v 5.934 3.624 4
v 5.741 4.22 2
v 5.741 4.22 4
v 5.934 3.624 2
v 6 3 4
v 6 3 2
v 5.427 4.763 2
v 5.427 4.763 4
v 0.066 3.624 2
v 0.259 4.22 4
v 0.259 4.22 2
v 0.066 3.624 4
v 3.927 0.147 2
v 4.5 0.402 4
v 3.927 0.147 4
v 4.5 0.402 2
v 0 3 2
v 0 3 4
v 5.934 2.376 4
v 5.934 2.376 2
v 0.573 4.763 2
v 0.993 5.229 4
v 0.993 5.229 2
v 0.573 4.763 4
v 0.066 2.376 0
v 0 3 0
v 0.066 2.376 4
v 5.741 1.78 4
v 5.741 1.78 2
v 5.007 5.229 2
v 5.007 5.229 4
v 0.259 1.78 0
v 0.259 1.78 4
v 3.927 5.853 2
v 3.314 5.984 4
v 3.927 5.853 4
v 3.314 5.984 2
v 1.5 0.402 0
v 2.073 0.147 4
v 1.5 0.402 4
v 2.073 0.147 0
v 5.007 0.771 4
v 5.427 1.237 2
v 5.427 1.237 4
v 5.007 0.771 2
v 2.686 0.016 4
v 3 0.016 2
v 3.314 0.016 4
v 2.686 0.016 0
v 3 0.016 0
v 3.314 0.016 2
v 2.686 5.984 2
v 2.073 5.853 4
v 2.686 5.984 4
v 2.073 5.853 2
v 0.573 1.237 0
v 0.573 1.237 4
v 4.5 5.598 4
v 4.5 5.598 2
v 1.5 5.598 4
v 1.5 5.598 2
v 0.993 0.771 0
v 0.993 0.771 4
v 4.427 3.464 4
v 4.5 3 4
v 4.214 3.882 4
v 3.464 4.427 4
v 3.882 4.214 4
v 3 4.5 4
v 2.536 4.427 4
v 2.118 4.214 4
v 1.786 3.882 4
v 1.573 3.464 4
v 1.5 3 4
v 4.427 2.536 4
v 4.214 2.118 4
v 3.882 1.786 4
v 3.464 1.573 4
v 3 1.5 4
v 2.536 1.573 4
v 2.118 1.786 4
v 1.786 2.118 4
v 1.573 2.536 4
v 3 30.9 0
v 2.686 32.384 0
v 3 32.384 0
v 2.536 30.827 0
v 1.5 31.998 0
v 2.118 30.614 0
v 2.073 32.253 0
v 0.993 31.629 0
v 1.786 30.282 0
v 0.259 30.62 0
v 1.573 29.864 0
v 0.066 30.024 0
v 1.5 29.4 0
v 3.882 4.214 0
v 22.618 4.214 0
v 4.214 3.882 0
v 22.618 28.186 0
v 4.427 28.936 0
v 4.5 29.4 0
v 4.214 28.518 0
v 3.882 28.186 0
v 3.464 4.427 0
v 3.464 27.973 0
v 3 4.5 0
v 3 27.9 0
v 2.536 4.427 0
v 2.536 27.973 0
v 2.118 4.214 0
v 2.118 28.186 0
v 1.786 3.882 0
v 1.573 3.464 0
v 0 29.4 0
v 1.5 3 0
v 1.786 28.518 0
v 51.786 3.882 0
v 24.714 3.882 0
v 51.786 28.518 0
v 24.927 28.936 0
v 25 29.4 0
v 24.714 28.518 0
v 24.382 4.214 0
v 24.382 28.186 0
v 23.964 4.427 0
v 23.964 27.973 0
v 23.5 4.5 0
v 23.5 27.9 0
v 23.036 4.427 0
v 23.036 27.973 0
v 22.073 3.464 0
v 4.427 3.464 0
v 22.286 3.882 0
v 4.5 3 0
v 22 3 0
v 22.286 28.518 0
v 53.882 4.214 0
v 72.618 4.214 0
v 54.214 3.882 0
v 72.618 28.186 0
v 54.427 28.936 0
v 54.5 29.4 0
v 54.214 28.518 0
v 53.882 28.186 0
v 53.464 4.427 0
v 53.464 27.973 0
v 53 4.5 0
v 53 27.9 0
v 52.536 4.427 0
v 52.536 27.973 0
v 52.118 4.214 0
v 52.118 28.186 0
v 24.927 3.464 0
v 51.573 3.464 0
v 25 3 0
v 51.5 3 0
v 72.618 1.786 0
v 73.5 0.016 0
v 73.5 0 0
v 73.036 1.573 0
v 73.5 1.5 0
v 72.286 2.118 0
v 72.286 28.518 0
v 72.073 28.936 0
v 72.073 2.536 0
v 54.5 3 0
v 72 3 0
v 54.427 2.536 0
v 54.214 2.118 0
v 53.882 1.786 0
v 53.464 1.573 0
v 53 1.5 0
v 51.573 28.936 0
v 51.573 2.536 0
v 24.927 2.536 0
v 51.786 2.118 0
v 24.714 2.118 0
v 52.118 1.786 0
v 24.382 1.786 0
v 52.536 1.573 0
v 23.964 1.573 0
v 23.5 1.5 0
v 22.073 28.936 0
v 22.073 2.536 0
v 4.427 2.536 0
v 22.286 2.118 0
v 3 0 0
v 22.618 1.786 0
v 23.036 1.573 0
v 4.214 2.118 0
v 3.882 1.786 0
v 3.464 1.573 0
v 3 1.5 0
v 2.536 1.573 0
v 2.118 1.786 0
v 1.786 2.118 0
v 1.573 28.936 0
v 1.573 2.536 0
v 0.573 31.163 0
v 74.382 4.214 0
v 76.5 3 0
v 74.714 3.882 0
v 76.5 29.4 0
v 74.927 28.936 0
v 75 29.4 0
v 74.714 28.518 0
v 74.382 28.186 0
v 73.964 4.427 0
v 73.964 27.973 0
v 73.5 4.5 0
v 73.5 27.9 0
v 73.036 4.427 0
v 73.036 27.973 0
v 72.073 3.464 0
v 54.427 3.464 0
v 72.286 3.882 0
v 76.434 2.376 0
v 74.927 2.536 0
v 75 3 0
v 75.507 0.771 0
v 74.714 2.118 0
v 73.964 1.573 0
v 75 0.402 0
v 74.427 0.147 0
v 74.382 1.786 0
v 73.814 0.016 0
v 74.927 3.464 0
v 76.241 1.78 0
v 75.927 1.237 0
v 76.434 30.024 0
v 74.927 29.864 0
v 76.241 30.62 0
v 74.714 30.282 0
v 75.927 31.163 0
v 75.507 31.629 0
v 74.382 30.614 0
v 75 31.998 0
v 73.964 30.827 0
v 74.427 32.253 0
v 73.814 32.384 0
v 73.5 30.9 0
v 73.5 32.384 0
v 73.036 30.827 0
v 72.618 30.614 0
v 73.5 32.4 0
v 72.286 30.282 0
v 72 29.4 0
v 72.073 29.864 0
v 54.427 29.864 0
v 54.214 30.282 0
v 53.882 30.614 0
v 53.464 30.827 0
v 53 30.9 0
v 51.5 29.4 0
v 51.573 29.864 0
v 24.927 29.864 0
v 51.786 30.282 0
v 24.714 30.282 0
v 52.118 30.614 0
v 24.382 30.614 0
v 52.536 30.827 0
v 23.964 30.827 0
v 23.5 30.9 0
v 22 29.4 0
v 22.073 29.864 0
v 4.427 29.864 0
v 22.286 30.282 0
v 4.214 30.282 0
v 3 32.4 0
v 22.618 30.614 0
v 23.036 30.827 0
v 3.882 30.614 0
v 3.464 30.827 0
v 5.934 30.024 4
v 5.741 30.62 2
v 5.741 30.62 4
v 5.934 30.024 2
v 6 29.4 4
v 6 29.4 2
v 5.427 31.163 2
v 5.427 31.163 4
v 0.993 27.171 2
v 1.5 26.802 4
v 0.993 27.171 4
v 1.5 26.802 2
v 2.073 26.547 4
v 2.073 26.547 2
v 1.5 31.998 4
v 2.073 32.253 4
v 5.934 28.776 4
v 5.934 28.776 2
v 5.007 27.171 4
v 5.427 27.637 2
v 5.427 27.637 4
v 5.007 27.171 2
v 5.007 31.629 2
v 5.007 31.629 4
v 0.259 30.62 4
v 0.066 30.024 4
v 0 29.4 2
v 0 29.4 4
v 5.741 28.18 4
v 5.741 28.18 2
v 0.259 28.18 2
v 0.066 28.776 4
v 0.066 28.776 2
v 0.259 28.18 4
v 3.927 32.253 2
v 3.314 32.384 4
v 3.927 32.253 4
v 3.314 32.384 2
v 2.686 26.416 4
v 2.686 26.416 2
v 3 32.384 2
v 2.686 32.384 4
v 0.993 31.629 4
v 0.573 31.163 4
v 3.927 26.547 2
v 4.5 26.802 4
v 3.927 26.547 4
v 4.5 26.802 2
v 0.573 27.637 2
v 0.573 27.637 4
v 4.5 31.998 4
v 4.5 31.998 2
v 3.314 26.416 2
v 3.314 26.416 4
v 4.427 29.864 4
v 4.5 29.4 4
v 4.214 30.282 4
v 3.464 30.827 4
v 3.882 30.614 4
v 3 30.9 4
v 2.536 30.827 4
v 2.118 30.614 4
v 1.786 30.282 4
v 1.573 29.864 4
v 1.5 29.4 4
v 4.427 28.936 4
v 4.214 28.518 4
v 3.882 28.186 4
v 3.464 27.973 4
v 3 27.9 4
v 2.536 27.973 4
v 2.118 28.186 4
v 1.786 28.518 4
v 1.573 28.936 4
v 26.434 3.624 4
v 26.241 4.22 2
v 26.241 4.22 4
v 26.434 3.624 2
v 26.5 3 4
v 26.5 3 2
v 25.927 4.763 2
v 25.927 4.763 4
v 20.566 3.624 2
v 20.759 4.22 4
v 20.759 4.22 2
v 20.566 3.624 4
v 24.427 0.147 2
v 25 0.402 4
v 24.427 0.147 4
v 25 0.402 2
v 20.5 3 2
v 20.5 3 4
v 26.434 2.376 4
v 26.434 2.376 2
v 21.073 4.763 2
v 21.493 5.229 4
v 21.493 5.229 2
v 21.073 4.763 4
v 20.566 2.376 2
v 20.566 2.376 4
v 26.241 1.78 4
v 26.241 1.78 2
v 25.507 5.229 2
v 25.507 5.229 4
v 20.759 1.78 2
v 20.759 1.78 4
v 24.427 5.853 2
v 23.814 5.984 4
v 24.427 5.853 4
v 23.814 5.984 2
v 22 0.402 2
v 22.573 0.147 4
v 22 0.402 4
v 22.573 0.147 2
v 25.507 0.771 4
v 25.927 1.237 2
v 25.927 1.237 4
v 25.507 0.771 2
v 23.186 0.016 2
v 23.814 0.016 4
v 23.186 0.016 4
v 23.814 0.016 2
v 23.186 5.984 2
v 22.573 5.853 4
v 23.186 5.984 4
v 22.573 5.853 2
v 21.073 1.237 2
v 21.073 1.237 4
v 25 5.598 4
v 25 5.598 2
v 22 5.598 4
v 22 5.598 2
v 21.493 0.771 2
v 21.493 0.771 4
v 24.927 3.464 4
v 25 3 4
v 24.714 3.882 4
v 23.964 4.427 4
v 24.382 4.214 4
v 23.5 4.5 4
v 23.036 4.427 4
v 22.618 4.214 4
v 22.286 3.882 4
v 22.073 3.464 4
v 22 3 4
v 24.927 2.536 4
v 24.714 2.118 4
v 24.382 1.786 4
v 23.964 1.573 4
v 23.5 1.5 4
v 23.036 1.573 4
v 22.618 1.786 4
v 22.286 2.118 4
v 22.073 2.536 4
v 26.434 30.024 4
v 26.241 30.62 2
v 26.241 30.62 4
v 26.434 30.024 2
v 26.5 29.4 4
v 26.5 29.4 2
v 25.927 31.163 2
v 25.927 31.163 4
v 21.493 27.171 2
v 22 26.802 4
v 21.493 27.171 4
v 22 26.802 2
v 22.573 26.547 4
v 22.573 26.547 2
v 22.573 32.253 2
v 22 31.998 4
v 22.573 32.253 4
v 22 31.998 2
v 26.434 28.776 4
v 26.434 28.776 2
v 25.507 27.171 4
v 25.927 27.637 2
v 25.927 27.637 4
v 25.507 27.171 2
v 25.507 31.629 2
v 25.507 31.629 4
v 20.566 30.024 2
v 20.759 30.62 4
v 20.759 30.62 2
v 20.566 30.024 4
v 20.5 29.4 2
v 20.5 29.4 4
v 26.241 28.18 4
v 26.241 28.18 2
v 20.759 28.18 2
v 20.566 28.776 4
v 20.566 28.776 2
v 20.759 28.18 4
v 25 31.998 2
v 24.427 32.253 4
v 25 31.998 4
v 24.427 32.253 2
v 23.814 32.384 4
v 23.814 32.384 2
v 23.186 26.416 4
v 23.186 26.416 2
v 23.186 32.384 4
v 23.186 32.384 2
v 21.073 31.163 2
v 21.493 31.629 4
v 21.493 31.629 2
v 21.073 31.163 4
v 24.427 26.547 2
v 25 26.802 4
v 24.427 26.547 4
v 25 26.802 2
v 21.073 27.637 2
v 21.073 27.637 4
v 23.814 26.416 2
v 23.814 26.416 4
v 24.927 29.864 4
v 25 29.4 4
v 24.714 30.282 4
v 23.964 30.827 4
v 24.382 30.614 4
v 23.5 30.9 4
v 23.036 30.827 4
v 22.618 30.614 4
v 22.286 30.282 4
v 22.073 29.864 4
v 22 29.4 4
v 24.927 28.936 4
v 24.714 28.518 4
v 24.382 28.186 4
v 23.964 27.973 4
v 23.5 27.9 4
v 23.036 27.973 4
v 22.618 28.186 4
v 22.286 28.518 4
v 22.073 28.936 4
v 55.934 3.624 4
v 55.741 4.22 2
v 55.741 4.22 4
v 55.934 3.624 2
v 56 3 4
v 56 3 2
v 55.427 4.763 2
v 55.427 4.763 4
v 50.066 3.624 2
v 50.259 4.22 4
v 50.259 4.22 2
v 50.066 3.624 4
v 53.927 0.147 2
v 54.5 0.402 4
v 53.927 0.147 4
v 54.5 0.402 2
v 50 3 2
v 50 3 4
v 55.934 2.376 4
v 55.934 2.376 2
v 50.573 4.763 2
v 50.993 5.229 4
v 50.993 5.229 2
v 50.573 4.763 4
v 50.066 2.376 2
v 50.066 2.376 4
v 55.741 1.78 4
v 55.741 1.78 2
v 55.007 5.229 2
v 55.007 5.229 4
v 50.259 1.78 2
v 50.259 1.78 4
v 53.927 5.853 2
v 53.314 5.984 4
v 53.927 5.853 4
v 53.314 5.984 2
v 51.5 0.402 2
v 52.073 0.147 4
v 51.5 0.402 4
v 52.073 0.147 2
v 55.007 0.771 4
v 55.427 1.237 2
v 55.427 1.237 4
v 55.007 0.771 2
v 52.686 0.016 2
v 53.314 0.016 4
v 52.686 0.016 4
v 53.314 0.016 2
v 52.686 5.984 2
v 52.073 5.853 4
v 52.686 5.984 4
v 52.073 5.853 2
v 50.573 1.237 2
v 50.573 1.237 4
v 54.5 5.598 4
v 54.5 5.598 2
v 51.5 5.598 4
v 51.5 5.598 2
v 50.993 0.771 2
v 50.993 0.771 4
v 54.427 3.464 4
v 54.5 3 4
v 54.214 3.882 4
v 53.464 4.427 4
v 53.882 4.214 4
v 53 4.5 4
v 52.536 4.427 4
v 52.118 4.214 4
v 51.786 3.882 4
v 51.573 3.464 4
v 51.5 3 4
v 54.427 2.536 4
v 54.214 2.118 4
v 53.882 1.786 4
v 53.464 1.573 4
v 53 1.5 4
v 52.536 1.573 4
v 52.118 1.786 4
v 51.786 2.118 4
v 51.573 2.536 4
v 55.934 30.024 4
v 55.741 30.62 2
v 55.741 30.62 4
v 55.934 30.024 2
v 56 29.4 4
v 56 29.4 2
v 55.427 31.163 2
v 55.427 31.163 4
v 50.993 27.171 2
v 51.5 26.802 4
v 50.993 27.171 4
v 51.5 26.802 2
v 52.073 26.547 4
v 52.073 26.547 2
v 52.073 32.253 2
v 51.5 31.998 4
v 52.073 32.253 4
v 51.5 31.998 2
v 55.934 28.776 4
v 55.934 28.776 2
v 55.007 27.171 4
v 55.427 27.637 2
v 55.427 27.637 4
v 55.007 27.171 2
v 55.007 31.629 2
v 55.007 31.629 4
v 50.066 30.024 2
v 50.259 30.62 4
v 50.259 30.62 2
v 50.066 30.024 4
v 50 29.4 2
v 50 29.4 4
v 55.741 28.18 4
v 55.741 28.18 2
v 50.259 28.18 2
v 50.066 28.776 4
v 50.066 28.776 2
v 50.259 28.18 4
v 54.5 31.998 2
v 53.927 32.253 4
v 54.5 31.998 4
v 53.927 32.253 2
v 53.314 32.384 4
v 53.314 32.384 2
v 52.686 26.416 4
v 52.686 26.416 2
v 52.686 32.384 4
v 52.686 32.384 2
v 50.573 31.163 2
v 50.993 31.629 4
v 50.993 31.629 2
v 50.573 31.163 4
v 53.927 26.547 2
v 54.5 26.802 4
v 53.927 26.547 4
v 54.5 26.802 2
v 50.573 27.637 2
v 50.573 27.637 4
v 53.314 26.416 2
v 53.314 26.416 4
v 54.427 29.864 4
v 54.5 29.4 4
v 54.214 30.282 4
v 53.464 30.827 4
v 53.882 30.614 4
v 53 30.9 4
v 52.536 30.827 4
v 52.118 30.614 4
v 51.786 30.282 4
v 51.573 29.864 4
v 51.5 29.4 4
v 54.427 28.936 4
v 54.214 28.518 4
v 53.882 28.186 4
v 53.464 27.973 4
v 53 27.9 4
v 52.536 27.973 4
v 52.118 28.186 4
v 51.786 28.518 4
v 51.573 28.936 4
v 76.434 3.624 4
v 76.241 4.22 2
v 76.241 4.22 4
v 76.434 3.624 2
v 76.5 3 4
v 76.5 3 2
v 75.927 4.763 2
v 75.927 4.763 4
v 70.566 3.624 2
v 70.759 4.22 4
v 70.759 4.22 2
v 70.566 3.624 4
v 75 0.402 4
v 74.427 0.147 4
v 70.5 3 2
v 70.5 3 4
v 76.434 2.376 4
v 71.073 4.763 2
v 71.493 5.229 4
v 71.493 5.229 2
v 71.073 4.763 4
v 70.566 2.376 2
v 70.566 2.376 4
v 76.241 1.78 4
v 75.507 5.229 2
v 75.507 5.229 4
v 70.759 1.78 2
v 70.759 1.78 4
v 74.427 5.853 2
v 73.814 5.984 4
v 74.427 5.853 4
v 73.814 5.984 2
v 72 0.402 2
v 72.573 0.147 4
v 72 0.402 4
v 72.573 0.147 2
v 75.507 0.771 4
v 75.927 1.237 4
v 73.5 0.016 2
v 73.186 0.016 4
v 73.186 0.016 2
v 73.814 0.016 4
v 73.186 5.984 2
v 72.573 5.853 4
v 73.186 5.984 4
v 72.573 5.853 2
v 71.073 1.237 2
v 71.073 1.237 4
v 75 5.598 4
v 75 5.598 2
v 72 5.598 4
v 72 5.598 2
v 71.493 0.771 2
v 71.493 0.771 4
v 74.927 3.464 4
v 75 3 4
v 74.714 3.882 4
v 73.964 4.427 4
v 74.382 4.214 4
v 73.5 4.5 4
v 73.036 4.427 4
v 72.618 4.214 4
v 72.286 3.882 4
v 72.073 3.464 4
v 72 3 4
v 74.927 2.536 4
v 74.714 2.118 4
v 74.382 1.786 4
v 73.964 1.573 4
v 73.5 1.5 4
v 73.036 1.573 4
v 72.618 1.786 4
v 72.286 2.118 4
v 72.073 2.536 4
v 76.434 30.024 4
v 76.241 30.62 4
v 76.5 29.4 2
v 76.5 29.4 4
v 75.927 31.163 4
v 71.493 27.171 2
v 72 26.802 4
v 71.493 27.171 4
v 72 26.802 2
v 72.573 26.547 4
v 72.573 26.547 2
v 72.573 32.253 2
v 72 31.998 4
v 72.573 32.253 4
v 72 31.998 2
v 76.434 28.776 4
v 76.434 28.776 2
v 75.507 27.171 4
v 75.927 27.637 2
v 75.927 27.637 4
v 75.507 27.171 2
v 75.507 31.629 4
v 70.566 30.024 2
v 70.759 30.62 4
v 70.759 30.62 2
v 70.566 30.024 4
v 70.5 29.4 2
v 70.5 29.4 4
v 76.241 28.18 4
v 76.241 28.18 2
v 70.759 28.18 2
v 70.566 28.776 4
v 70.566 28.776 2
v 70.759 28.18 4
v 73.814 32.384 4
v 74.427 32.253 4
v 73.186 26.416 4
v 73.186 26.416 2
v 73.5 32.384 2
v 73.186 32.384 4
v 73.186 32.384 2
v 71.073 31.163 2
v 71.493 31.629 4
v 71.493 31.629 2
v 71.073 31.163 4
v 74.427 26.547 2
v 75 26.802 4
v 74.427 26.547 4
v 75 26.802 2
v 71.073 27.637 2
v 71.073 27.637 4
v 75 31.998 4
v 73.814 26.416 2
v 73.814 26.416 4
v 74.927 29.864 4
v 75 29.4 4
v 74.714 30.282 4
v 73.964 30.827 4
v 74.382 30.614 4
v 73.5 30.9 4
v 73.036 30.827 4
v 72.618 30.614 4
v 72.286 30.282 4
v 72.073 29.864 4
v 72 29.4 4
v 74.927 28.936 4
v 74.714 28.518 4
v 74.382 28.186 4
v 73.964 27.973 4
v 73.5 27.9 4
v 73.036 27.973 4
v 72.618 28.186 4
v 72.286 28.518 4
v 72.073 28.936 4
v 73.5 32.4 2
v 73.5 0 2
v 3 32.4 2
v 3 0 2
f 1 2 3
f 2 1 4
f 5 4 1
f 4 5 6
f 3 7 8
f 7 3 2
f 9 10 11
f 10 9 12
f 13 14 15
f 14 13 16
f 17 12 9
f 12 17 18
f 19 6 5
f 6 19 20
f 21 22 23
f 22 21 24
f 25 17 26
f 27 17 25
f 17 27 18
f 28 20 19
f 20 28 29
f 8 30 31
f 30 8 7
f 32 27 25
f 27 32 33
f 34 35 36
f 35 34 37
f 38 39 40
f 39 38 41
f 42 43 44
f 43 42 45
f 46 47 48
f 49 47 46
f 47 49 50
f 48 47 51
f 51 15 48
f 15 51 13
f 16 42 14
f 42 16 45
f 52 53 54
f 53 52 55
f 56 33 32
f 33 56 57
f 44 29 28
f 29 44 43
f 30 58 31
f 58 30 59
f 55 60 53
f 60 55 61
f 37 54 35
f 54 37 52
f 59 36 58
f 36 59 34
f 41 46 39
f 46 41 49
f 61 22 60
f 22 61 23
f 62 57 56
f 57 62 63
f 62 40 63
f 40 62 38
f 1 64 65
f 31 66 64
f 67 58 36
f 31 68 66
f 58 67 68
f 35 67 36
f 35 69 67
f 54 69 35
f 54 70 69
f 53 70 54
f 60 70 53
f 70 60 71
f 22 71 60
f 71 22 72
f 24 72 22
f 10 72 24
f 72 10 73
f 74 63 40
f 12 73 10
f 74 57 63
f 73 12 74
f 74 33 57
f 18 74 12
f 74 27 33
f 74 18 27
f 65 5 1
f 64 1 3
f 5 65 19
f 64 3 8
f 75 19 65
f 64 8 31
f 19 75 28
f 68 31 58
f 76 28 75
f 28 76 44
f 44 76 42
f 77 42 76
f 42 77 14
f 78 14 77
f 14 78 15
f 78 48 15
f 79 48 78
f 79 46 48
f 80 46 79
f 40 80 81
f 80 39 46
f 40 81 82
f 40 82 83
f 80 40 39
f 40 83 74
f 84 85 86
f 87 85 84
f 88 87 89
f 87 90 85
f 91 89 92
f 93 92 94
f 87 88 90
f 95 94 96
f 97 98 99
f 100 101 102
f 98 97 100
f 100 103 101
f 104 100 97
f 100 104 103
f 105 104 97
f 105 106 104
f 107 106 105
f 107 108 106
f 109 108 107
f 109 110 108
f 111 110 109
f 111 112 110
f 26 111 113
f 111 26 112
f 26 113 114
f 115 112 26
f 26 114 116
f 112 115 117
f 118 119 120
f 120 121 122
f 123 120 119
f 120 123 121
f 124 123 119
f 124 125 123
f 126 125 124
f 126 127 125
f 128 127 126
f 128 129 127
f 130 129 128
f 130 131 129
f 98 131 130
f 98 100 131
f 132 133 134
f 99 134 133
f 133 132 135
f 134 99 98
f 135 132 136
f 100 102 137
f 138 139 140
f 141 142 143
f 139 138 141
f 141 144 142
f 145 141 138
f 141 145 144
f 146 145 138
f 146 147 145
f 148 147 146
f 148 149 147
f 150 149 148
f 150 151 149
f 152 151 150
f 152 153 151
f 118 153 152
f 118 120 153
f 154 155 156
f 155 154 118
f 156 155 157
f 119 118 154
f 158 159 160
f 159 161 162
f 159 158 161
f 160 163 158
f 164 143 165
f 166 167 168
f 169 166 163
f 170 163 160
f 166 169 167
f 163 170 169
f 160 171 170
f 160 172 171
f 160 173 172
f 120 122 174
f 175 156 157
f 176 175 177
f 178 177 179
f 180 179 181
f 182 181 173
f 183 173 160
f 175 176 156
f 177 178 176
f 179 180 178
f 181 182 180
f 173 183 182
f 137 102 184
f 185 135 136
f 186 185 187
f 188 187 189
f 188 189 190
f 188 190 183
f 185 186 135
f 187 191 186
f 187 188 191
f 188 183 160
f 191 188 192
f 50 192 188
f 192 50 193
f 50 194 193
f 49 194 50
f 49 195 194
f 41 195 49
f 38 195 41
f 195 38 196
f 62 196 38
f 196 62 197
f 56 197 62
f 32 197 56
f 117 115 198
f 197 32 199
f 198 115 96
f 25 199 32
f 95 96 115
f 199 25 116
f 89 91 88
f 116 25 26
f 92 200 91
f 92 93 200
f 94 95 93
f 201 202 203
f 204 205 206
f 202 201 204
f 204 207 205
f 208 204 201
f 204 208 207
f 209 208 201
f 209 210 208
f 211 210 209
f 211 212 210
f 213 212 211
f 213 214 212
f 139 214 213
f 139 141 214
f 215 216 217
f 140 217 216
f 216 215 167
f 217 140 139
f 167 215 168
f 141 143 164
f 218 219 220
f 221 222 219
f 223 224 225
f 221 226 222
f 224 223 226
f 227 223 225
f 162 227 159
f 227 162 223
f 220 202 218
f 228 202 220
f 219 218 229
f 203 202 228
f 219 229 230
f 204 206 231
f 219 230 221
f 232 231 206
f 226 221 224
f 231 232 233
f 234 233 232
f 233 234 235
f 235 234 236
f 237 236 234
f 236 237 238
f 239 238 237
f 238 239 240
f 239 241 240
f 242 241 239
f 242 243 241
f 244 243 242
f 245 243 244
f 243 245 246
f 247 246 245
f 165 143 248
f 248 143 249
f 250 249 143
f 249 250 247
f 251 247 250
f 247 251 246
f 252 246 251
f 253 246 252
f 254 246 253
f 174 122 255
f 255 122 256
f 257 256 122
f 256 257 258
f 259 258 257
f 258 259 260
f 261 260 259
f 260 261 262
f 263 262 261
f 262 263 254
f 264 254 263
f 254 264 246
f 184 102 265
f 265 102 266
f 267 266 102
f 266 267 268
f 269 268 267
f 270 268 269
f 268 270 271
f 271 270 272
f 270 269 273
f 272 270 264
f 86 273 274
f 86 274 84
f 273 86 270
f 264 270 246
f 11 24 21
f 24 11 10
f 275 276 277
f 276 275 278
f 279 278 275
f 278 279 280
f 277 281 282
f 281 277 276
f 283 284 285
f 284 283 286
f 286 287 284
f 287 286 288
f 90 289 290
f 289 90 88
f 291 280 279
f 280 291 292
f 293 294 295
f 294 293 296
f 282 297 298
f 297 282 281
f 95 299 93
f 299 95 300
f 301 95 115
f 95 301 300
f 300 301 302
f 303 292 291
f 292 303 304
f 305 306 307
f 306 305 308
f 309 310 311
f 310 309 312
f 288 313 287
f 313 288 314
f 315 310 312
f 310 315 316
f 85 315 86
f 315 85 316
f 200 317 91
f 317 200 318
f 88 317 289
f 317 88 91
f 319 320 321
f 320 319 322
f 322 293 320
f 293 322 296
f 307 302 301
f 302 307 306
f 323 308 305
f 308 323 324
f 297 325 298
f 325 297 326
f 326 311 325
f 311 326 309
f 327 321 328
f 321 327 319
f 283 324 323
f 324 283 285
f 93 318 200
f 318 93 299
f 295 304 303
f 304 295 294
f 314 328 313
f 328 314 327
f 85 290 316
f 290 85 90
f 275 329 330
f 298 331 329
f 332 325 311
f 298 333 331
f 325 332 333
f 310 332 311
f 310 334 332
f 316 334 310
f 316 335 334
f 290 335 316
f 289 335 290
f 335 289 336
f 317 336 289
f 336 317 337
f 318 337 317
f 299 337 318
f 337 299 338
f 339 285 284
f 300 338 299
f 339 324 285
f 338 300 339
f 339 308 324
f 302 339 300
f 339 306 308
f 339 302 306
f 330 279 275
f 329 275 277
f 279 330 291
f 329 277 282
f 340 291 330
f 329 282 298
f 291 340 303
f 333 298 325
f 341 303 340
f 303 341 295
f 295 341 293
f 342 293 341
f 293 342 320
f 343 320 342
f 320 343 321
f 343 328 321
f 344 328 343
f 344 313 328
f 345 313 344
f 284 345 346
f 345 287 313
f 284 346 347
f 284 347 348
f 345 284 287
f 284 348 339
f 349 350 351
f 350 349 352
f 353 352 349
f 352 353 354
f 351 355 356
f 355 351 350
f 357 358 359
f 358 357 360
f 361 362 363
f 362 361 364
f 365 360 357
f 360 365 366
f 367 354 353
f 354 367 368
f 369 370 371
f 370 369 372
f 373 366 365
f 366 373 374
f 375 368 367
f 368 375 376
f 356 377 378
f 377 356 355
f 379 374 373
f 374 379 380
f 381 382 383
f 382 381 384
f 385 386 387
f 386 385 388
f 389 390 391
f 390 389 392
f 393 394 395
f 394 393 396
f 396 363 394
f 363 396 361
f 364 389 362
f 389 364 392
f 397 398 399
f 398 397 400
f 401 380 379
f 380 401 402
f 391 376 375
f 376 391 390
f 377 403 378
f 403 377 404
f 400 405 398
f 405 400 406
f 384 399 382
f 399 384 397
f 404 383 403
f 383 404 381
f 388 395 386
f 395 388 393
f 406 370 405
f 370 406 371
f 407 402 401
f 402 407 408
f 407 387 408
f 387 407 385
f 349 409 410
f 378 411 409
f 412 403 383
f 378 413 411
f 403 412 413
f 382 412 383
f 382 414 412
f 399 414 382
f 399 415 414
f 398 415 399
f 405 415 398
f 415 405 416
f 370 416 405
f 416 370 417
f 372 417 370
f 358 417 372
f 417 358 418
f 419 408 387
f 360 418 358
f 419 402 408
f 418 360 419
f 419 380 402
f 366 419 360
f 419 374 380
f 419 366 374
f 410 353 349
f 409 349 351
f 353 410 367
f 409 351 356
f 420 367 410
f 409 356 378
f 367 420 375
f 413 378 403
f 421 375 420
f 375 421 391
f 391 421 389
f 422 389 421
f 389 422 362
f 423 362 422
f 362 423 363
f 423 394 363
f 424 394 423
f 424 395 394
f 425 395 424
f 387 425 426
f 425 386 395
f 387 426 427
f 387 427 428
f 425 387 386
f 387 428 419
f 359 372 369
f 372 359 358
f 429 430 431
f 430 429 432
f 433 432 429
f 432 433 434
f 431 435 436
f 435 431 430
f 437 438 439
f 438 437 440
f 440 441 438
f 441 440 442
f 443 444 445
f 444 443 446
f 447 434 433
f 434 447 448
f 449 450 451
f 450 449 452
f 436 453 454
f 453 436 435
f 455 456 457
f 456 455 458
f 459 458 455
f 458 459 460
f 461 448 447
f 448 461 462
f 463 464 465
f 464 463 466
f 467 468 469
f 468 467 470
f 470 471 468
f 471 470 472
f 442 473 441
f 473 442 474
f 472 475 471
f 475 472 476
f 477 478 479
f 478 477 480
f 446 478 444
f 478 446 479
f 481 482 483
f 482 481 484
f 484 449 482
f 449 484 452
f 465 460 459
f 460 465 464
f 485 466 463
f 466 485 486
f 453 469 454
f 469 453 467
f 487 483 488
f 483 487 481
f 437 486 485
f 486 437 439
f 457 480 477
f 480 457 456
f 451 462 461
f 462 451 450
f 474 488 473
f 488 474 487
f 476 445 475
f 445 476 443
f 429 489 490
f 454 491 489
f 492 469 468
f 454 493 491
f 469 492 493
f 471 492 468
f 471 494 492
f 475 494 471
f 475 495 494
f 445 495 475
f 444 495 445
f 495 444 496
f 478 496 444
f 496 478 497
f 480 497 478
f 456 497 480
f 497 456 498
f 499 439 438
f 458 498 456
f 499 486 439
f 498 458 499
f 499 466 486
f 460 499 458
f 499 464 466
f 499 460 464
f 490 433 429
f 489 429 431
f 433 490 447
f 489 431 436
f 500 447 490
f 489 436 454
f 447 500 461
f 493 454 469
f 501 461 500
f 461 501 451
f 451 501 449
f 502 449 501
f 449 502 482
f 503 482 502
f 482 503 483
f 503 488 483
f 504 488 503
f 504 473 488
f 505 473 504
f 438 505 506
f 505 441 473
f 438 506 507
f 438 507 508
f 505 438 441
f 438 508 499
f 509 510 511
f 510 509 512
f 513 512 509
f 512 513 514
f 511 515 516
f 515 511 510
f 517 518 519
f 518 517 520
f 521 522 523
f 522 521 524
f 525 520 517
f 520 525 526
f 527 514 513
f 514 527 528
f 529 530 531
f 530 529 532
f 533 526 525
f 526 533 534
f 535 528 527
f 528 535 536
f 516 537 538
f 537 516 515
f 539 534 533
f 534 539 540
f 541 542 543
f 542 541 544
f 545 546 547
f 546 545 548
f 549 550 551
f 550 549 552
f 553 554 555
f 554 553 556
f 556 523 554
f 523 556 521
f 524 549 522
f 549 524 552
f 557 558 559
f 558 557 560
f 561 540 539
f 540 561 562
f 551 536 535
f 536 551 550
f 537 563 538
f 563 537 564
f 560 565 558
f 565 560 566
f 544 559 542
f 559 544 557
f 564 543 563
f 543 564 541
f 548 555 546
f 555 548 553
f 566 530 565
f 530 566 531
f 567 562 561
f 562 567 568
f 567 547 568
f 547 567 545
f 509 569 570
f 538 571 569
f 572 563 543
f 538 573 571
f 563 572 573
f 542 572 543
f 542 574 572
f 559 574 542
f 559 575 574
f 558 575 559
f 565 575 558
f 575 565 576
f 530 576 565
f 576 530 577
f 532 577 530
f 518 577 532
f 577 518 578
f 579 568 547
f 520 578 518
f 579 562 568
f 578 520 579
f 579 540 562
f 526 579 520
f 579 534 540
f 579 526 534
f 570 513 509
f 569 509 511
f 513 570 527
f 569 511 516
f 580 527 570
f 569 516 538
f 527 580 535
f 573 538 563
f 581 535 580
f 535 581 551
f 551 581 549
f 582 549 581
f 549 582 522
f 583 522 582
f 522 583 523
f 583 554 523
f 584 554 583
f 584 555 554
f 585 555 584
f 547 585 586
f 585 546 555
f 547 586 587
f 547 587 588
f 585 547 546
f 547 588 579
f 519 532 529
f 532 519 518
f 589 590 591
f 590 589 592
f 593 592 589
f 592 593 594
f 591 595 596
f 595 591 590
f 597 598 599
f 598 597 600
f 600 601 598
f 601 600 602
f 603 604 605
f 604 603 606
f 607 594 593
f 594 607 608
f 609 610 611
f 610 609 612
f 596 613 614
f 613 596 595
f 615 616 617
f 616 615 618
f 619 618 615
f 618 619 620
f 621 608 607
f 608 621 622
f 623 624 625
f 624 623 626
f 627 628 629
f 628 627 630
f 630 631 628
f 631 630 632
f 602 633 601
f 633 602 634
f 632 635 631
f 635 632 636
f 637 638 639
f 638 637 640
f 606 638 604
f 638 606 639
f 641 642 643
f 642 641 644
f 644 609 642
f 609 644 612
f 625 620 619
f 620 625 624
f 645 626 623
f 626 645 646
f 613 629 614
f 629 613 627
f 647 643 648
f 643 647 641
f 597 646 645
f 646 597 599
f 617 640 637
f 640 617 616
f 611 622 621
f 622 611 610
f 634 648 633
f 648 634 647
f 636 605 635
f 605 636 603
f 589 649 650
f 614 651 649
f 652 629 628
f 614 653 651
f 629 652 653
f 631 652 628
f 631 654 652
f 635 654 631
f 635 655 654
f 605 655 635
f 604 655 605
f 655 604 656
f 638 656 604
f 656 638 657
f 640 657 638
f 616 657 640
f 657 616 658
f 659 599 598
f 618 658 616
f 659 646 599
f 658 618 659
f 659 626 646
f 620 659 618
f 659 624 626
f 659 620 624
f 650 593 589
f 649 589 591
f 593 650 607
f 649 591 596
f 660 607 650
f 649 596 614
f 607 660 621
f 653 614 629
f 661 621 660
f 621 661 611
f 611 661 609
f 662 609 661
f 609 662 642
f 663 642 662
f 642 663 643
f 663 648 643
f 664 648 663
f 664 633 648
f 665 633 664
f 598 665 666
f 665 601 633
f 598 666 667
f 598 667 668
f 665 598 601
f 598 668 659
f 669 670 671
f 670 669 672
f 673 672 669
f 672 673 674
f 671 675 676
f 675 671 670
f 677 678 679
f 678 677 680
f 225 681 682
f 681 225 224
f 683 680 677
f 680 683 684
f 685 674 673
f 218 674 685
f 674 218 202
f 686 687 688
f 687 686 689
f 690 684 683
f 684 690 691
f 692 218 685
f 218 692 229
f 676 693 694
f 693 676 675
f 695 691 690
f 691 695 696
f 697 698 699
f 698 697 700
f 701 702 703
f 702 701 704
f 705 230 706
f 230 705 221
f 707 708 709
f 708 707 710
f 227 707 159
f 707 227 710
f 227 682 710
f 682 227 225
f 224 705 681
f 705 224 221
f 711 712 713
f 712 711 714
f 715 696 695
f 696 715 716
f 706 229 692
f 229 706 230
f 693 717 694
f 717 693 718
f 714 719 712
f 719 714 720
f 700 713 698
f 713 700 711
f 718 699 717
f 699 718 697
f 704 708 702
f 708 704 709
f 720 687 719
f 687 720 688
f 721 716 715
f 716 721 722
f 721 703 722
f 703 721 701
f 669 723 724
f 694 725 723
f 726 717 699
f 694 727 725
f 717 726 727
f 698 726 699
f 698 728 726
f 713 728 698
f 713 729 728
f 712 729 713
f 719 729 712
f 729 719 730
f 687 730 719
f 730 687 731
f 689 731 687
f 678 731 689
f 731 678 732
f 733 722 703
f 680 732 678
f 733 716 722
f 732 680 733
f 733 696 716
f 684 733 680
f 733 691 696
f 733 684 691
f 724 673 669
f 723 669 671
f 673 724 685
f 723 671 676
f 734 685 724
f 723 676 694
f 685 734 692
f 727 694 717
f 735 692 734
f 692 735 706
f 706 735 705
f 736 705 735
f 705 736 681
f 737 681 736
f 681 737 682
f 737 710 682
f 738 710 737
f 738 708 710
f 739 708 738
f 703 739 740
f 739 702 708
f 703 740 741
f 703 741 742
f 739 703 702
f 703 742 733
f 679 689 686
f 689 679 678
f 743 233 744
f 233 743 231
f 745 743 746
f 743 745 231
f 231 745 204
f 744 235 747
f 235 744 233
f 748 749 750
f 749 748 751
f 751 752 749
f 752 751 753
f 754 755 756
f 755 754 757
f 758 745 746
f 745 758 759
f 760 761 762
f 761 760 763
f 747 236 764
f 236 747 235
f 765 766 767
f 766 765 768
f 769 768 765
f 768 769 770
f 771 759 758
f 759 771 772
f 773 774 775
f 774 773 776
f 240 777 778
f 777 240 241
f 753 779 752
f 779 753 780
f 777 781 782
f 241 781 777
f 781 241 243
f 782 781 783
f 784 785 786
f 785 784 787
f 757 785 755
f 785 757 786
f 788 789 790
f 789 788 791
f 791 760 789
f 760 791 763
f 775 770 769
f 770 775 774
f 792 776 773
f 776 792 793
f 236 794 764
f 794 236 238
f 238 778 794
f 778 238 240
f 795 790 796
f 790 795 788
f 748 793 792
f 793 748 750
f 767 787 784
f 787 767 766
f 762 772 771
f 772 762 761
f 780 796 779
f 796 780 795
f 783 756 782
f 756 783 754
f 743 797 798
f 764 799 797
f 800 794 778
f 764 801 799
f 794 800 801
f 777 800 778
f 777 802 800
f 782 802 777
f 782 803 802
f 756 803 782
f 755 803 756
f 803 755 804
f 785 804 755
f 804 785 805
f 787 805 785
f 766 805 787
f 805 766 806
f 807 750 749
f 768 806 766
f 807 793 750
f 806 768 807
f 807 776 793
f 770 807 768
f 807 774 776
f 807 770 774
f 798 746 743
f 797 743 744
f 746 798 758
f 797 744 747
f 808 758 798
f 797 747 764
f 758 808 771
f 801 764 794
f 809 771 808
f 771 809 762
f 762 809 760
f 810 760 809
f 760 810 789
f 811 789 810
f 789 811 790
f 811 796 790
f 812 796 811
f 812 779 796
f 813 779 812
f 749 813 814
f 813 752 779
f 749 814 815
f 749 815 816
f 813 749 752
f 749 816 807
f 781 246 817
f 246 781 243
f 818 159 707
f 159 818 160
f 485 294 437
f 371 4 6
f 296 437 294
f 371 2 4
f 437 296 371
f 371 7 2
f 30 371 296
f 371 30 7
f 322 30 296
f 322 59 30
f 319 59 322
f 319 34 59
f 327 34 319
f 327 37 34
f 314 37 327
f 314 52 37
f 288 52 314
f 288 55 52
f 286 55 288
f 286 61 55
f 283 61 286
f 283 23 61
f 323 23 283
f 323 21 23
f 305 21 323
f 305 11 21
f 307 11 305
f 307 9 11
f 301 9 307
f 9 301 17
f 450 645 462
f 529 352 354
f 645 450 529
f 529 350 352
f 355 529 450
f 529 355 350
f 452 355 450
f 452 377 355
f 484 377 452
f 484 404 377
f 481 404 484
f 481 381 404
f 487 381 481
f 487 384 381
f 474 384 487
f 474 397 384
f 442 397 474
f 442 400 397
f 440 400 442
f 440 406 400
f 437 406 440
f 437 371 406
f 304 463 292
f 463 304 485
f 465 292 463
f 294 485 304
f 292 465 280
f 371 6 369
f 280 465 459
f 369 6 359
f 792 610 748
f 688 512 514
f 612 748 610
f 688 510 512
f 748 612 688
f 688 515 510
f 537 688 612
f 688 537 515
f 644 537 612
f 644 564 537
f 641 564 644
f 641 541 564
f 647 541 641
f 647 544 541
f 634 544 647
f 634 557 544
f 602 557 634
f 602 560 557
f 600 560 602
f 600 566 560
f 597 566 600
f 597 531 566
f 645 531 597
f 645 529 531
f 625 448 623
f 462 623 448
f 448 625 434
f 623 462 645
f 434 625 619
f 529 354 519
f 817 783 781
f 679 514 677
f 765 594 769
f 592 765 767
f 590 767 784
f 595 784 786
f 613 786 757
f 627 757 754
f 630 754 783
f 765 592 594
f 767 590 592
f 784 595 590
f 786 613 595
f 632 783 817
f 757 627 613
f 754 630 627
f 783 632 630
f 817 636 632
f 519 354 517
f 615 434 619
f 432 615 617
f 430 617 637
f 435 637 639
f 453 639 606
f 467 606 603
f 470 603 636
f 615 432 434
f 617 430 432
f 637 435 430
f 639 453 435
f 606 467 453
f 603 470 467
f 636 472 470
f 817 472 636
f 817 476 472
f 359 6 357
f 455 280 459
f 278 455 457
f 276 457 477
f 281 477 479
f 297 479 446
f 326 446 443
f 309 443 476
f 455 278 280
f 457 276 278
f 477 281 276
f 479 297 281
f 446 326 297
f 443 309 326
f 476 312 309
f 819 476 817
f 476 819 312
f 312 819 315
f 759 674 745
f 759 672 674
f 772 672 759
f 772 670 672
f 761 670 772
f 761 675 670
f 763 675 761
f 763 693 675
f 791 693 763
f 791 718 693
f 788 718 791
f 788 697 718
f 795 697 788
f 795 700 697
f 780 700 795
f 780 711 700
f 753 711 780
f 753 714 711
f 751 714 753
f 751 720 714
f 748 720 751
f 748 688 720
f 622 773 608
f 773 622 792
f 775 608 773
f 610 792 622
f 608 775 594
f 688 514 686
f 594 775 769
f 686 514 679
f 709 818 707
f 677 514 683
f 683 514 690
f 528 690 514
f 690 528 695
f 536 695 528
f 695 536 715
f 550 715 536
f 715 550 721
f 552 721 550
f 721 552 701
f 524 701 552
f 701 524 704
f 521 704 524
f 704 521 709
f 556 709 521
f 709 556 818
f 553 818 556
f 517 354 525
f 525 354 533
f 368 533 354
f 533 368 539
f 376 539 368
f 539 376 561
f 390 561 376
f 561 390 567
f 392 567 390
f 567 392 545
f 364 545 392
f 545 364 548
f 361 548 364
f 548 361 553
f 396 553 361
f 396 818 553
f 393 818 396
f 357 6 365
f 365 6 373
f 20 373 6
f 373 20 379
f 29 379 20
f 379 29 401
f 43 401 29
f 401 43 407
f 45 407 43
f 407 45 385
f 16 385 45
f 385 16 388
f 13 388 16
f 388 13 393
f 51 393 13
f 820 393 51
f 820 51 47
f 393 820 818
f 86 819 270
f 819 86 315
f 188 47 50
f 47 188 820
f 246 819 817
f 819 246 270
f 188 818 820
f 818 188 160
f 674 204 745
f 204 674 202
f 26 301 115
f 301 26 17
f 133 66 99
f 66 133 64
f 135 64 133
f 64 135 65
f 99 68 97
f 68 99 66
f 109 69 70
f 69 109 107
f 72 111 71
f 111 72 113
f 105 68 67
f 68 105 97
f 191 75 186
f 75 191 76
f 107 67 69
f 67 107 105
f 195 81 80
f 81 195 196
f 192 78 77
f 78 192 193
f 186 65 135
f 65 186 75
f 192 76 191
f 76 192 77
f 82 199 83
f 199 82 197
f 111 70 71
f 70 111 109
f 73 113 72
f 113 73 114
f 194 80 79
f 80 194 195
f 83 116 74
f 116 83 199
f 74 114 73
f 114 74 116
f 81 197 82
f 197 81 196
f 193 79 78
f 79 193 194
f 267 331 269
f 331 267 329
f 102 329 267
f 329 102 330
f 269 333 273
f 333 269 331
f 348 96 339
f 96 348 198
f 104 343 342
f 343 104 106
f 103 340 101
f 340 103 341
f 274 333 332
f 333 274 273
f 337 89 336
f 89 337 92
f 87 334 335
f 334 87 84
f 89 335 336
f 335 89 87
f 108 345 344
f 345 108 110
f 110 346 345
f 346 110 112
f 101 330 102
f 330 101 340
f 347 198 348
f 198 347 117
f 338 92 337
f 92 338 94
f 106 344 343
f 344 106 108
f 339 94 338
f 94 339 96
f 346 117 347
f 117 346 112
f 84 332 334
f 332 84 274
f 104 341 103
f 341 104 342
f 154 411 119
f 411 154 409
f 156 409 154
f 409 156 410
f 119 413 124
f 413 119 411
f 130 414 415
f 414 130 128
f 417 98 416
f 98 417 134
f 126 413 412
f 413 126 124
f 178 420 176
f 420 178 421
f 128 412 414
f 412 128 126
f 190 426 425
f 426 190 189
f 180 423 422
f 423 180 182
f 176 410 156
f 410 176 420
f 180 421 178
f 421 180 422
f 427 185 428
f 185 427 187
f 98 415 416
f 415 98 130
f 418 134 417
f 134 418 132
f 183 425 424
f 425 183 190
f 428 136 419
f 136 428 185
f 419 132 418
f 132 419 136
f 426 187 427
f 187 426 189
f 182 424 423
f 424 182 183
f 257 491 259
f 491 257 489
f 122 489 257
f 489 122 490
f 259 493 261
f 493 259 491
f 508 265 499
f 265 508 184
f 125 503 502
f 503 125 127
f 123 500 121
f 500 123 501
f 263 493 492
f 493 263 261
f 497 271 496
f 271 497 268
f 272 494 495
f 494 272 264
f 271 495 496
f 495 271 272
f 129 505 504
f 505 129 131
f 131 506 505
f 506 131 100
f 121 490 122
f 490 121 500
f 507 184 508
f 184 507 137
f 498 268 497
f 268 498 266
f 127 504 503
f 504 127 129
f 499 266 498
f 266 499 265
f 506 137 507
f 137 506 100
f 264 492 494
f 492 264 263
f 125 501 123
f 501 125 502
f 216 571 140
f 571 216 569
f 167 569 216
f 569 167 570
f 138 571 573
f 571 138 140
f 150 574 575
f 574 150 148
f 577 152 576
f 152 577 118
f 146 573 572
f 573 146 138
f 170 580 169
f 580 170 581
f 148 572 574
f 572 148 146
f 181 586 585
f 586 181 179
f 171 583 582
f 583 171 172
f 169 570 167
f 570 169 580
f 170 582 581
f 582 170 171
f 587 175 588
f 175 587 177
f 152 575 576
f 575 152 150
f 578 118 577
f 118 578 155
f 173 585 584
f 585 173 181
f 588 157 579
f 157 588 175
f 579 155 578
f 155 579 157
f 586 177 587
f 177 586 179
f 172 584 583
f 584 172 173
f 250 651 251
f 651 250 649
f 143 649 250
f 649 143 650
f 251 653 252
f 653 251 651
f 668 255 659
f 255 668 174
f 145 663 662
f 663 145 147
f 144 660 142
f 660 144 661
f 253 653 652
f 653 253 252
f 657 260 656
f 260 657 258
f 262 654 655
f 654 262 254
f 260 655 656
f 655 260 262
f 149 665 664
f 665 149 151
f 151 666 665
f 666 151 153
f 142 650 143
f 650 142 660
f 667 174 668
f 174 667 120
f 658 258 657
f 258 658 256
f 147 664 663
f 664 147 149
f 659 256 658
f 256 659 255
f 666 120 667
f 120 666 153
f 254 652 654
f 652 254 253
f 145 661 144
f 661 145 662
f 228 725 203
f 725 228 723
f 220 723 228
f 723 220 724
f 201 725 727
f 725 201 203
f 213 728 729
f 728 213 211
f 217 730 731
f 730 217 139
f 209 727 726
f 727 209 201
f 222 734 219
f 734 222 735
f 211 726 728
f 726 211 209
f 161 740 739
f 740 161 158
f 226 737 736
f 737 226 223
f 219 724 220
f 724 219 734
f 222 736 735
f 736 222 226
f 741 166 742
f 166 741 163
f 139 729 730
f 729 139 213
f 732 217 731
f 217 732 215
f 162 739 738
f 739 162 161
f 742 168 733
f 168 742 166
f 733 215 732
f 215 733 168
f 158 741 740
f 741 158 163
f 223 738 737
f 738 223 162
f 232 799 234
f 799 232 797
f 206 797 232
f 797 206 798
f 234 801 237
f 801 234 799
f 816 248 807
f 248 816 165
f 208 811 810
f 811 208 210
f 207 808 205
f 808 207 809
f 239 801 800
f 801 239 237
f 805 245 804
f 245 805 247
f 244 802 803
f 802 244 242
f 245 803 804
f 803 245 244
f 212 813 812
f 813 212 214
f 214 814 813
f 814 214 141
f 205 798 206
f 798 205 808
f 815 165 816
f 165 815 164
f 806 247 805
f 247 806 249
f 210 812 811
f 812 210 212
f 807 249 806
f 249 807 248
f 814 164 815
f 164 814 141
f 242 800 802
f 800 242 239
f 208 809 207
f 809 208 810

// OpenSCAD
difference(){
  union(){
    translate([3,0]) cube([70.5,32.4,2]);
    translate([0,3]) cube([76.5,26.4,2]);
    for(x=[0,20.5,50,70.5],y=[0,26.4])
      translate([x+3,y+3]) cylinder(d=6,h=4,$fn=30);
  }
  for(x=[0,20.5,50,70.5],y=[0,26.4])
    translate([x+3,y+3,-.01]) cylinder(d=3,h=5,$fn=20);
}
